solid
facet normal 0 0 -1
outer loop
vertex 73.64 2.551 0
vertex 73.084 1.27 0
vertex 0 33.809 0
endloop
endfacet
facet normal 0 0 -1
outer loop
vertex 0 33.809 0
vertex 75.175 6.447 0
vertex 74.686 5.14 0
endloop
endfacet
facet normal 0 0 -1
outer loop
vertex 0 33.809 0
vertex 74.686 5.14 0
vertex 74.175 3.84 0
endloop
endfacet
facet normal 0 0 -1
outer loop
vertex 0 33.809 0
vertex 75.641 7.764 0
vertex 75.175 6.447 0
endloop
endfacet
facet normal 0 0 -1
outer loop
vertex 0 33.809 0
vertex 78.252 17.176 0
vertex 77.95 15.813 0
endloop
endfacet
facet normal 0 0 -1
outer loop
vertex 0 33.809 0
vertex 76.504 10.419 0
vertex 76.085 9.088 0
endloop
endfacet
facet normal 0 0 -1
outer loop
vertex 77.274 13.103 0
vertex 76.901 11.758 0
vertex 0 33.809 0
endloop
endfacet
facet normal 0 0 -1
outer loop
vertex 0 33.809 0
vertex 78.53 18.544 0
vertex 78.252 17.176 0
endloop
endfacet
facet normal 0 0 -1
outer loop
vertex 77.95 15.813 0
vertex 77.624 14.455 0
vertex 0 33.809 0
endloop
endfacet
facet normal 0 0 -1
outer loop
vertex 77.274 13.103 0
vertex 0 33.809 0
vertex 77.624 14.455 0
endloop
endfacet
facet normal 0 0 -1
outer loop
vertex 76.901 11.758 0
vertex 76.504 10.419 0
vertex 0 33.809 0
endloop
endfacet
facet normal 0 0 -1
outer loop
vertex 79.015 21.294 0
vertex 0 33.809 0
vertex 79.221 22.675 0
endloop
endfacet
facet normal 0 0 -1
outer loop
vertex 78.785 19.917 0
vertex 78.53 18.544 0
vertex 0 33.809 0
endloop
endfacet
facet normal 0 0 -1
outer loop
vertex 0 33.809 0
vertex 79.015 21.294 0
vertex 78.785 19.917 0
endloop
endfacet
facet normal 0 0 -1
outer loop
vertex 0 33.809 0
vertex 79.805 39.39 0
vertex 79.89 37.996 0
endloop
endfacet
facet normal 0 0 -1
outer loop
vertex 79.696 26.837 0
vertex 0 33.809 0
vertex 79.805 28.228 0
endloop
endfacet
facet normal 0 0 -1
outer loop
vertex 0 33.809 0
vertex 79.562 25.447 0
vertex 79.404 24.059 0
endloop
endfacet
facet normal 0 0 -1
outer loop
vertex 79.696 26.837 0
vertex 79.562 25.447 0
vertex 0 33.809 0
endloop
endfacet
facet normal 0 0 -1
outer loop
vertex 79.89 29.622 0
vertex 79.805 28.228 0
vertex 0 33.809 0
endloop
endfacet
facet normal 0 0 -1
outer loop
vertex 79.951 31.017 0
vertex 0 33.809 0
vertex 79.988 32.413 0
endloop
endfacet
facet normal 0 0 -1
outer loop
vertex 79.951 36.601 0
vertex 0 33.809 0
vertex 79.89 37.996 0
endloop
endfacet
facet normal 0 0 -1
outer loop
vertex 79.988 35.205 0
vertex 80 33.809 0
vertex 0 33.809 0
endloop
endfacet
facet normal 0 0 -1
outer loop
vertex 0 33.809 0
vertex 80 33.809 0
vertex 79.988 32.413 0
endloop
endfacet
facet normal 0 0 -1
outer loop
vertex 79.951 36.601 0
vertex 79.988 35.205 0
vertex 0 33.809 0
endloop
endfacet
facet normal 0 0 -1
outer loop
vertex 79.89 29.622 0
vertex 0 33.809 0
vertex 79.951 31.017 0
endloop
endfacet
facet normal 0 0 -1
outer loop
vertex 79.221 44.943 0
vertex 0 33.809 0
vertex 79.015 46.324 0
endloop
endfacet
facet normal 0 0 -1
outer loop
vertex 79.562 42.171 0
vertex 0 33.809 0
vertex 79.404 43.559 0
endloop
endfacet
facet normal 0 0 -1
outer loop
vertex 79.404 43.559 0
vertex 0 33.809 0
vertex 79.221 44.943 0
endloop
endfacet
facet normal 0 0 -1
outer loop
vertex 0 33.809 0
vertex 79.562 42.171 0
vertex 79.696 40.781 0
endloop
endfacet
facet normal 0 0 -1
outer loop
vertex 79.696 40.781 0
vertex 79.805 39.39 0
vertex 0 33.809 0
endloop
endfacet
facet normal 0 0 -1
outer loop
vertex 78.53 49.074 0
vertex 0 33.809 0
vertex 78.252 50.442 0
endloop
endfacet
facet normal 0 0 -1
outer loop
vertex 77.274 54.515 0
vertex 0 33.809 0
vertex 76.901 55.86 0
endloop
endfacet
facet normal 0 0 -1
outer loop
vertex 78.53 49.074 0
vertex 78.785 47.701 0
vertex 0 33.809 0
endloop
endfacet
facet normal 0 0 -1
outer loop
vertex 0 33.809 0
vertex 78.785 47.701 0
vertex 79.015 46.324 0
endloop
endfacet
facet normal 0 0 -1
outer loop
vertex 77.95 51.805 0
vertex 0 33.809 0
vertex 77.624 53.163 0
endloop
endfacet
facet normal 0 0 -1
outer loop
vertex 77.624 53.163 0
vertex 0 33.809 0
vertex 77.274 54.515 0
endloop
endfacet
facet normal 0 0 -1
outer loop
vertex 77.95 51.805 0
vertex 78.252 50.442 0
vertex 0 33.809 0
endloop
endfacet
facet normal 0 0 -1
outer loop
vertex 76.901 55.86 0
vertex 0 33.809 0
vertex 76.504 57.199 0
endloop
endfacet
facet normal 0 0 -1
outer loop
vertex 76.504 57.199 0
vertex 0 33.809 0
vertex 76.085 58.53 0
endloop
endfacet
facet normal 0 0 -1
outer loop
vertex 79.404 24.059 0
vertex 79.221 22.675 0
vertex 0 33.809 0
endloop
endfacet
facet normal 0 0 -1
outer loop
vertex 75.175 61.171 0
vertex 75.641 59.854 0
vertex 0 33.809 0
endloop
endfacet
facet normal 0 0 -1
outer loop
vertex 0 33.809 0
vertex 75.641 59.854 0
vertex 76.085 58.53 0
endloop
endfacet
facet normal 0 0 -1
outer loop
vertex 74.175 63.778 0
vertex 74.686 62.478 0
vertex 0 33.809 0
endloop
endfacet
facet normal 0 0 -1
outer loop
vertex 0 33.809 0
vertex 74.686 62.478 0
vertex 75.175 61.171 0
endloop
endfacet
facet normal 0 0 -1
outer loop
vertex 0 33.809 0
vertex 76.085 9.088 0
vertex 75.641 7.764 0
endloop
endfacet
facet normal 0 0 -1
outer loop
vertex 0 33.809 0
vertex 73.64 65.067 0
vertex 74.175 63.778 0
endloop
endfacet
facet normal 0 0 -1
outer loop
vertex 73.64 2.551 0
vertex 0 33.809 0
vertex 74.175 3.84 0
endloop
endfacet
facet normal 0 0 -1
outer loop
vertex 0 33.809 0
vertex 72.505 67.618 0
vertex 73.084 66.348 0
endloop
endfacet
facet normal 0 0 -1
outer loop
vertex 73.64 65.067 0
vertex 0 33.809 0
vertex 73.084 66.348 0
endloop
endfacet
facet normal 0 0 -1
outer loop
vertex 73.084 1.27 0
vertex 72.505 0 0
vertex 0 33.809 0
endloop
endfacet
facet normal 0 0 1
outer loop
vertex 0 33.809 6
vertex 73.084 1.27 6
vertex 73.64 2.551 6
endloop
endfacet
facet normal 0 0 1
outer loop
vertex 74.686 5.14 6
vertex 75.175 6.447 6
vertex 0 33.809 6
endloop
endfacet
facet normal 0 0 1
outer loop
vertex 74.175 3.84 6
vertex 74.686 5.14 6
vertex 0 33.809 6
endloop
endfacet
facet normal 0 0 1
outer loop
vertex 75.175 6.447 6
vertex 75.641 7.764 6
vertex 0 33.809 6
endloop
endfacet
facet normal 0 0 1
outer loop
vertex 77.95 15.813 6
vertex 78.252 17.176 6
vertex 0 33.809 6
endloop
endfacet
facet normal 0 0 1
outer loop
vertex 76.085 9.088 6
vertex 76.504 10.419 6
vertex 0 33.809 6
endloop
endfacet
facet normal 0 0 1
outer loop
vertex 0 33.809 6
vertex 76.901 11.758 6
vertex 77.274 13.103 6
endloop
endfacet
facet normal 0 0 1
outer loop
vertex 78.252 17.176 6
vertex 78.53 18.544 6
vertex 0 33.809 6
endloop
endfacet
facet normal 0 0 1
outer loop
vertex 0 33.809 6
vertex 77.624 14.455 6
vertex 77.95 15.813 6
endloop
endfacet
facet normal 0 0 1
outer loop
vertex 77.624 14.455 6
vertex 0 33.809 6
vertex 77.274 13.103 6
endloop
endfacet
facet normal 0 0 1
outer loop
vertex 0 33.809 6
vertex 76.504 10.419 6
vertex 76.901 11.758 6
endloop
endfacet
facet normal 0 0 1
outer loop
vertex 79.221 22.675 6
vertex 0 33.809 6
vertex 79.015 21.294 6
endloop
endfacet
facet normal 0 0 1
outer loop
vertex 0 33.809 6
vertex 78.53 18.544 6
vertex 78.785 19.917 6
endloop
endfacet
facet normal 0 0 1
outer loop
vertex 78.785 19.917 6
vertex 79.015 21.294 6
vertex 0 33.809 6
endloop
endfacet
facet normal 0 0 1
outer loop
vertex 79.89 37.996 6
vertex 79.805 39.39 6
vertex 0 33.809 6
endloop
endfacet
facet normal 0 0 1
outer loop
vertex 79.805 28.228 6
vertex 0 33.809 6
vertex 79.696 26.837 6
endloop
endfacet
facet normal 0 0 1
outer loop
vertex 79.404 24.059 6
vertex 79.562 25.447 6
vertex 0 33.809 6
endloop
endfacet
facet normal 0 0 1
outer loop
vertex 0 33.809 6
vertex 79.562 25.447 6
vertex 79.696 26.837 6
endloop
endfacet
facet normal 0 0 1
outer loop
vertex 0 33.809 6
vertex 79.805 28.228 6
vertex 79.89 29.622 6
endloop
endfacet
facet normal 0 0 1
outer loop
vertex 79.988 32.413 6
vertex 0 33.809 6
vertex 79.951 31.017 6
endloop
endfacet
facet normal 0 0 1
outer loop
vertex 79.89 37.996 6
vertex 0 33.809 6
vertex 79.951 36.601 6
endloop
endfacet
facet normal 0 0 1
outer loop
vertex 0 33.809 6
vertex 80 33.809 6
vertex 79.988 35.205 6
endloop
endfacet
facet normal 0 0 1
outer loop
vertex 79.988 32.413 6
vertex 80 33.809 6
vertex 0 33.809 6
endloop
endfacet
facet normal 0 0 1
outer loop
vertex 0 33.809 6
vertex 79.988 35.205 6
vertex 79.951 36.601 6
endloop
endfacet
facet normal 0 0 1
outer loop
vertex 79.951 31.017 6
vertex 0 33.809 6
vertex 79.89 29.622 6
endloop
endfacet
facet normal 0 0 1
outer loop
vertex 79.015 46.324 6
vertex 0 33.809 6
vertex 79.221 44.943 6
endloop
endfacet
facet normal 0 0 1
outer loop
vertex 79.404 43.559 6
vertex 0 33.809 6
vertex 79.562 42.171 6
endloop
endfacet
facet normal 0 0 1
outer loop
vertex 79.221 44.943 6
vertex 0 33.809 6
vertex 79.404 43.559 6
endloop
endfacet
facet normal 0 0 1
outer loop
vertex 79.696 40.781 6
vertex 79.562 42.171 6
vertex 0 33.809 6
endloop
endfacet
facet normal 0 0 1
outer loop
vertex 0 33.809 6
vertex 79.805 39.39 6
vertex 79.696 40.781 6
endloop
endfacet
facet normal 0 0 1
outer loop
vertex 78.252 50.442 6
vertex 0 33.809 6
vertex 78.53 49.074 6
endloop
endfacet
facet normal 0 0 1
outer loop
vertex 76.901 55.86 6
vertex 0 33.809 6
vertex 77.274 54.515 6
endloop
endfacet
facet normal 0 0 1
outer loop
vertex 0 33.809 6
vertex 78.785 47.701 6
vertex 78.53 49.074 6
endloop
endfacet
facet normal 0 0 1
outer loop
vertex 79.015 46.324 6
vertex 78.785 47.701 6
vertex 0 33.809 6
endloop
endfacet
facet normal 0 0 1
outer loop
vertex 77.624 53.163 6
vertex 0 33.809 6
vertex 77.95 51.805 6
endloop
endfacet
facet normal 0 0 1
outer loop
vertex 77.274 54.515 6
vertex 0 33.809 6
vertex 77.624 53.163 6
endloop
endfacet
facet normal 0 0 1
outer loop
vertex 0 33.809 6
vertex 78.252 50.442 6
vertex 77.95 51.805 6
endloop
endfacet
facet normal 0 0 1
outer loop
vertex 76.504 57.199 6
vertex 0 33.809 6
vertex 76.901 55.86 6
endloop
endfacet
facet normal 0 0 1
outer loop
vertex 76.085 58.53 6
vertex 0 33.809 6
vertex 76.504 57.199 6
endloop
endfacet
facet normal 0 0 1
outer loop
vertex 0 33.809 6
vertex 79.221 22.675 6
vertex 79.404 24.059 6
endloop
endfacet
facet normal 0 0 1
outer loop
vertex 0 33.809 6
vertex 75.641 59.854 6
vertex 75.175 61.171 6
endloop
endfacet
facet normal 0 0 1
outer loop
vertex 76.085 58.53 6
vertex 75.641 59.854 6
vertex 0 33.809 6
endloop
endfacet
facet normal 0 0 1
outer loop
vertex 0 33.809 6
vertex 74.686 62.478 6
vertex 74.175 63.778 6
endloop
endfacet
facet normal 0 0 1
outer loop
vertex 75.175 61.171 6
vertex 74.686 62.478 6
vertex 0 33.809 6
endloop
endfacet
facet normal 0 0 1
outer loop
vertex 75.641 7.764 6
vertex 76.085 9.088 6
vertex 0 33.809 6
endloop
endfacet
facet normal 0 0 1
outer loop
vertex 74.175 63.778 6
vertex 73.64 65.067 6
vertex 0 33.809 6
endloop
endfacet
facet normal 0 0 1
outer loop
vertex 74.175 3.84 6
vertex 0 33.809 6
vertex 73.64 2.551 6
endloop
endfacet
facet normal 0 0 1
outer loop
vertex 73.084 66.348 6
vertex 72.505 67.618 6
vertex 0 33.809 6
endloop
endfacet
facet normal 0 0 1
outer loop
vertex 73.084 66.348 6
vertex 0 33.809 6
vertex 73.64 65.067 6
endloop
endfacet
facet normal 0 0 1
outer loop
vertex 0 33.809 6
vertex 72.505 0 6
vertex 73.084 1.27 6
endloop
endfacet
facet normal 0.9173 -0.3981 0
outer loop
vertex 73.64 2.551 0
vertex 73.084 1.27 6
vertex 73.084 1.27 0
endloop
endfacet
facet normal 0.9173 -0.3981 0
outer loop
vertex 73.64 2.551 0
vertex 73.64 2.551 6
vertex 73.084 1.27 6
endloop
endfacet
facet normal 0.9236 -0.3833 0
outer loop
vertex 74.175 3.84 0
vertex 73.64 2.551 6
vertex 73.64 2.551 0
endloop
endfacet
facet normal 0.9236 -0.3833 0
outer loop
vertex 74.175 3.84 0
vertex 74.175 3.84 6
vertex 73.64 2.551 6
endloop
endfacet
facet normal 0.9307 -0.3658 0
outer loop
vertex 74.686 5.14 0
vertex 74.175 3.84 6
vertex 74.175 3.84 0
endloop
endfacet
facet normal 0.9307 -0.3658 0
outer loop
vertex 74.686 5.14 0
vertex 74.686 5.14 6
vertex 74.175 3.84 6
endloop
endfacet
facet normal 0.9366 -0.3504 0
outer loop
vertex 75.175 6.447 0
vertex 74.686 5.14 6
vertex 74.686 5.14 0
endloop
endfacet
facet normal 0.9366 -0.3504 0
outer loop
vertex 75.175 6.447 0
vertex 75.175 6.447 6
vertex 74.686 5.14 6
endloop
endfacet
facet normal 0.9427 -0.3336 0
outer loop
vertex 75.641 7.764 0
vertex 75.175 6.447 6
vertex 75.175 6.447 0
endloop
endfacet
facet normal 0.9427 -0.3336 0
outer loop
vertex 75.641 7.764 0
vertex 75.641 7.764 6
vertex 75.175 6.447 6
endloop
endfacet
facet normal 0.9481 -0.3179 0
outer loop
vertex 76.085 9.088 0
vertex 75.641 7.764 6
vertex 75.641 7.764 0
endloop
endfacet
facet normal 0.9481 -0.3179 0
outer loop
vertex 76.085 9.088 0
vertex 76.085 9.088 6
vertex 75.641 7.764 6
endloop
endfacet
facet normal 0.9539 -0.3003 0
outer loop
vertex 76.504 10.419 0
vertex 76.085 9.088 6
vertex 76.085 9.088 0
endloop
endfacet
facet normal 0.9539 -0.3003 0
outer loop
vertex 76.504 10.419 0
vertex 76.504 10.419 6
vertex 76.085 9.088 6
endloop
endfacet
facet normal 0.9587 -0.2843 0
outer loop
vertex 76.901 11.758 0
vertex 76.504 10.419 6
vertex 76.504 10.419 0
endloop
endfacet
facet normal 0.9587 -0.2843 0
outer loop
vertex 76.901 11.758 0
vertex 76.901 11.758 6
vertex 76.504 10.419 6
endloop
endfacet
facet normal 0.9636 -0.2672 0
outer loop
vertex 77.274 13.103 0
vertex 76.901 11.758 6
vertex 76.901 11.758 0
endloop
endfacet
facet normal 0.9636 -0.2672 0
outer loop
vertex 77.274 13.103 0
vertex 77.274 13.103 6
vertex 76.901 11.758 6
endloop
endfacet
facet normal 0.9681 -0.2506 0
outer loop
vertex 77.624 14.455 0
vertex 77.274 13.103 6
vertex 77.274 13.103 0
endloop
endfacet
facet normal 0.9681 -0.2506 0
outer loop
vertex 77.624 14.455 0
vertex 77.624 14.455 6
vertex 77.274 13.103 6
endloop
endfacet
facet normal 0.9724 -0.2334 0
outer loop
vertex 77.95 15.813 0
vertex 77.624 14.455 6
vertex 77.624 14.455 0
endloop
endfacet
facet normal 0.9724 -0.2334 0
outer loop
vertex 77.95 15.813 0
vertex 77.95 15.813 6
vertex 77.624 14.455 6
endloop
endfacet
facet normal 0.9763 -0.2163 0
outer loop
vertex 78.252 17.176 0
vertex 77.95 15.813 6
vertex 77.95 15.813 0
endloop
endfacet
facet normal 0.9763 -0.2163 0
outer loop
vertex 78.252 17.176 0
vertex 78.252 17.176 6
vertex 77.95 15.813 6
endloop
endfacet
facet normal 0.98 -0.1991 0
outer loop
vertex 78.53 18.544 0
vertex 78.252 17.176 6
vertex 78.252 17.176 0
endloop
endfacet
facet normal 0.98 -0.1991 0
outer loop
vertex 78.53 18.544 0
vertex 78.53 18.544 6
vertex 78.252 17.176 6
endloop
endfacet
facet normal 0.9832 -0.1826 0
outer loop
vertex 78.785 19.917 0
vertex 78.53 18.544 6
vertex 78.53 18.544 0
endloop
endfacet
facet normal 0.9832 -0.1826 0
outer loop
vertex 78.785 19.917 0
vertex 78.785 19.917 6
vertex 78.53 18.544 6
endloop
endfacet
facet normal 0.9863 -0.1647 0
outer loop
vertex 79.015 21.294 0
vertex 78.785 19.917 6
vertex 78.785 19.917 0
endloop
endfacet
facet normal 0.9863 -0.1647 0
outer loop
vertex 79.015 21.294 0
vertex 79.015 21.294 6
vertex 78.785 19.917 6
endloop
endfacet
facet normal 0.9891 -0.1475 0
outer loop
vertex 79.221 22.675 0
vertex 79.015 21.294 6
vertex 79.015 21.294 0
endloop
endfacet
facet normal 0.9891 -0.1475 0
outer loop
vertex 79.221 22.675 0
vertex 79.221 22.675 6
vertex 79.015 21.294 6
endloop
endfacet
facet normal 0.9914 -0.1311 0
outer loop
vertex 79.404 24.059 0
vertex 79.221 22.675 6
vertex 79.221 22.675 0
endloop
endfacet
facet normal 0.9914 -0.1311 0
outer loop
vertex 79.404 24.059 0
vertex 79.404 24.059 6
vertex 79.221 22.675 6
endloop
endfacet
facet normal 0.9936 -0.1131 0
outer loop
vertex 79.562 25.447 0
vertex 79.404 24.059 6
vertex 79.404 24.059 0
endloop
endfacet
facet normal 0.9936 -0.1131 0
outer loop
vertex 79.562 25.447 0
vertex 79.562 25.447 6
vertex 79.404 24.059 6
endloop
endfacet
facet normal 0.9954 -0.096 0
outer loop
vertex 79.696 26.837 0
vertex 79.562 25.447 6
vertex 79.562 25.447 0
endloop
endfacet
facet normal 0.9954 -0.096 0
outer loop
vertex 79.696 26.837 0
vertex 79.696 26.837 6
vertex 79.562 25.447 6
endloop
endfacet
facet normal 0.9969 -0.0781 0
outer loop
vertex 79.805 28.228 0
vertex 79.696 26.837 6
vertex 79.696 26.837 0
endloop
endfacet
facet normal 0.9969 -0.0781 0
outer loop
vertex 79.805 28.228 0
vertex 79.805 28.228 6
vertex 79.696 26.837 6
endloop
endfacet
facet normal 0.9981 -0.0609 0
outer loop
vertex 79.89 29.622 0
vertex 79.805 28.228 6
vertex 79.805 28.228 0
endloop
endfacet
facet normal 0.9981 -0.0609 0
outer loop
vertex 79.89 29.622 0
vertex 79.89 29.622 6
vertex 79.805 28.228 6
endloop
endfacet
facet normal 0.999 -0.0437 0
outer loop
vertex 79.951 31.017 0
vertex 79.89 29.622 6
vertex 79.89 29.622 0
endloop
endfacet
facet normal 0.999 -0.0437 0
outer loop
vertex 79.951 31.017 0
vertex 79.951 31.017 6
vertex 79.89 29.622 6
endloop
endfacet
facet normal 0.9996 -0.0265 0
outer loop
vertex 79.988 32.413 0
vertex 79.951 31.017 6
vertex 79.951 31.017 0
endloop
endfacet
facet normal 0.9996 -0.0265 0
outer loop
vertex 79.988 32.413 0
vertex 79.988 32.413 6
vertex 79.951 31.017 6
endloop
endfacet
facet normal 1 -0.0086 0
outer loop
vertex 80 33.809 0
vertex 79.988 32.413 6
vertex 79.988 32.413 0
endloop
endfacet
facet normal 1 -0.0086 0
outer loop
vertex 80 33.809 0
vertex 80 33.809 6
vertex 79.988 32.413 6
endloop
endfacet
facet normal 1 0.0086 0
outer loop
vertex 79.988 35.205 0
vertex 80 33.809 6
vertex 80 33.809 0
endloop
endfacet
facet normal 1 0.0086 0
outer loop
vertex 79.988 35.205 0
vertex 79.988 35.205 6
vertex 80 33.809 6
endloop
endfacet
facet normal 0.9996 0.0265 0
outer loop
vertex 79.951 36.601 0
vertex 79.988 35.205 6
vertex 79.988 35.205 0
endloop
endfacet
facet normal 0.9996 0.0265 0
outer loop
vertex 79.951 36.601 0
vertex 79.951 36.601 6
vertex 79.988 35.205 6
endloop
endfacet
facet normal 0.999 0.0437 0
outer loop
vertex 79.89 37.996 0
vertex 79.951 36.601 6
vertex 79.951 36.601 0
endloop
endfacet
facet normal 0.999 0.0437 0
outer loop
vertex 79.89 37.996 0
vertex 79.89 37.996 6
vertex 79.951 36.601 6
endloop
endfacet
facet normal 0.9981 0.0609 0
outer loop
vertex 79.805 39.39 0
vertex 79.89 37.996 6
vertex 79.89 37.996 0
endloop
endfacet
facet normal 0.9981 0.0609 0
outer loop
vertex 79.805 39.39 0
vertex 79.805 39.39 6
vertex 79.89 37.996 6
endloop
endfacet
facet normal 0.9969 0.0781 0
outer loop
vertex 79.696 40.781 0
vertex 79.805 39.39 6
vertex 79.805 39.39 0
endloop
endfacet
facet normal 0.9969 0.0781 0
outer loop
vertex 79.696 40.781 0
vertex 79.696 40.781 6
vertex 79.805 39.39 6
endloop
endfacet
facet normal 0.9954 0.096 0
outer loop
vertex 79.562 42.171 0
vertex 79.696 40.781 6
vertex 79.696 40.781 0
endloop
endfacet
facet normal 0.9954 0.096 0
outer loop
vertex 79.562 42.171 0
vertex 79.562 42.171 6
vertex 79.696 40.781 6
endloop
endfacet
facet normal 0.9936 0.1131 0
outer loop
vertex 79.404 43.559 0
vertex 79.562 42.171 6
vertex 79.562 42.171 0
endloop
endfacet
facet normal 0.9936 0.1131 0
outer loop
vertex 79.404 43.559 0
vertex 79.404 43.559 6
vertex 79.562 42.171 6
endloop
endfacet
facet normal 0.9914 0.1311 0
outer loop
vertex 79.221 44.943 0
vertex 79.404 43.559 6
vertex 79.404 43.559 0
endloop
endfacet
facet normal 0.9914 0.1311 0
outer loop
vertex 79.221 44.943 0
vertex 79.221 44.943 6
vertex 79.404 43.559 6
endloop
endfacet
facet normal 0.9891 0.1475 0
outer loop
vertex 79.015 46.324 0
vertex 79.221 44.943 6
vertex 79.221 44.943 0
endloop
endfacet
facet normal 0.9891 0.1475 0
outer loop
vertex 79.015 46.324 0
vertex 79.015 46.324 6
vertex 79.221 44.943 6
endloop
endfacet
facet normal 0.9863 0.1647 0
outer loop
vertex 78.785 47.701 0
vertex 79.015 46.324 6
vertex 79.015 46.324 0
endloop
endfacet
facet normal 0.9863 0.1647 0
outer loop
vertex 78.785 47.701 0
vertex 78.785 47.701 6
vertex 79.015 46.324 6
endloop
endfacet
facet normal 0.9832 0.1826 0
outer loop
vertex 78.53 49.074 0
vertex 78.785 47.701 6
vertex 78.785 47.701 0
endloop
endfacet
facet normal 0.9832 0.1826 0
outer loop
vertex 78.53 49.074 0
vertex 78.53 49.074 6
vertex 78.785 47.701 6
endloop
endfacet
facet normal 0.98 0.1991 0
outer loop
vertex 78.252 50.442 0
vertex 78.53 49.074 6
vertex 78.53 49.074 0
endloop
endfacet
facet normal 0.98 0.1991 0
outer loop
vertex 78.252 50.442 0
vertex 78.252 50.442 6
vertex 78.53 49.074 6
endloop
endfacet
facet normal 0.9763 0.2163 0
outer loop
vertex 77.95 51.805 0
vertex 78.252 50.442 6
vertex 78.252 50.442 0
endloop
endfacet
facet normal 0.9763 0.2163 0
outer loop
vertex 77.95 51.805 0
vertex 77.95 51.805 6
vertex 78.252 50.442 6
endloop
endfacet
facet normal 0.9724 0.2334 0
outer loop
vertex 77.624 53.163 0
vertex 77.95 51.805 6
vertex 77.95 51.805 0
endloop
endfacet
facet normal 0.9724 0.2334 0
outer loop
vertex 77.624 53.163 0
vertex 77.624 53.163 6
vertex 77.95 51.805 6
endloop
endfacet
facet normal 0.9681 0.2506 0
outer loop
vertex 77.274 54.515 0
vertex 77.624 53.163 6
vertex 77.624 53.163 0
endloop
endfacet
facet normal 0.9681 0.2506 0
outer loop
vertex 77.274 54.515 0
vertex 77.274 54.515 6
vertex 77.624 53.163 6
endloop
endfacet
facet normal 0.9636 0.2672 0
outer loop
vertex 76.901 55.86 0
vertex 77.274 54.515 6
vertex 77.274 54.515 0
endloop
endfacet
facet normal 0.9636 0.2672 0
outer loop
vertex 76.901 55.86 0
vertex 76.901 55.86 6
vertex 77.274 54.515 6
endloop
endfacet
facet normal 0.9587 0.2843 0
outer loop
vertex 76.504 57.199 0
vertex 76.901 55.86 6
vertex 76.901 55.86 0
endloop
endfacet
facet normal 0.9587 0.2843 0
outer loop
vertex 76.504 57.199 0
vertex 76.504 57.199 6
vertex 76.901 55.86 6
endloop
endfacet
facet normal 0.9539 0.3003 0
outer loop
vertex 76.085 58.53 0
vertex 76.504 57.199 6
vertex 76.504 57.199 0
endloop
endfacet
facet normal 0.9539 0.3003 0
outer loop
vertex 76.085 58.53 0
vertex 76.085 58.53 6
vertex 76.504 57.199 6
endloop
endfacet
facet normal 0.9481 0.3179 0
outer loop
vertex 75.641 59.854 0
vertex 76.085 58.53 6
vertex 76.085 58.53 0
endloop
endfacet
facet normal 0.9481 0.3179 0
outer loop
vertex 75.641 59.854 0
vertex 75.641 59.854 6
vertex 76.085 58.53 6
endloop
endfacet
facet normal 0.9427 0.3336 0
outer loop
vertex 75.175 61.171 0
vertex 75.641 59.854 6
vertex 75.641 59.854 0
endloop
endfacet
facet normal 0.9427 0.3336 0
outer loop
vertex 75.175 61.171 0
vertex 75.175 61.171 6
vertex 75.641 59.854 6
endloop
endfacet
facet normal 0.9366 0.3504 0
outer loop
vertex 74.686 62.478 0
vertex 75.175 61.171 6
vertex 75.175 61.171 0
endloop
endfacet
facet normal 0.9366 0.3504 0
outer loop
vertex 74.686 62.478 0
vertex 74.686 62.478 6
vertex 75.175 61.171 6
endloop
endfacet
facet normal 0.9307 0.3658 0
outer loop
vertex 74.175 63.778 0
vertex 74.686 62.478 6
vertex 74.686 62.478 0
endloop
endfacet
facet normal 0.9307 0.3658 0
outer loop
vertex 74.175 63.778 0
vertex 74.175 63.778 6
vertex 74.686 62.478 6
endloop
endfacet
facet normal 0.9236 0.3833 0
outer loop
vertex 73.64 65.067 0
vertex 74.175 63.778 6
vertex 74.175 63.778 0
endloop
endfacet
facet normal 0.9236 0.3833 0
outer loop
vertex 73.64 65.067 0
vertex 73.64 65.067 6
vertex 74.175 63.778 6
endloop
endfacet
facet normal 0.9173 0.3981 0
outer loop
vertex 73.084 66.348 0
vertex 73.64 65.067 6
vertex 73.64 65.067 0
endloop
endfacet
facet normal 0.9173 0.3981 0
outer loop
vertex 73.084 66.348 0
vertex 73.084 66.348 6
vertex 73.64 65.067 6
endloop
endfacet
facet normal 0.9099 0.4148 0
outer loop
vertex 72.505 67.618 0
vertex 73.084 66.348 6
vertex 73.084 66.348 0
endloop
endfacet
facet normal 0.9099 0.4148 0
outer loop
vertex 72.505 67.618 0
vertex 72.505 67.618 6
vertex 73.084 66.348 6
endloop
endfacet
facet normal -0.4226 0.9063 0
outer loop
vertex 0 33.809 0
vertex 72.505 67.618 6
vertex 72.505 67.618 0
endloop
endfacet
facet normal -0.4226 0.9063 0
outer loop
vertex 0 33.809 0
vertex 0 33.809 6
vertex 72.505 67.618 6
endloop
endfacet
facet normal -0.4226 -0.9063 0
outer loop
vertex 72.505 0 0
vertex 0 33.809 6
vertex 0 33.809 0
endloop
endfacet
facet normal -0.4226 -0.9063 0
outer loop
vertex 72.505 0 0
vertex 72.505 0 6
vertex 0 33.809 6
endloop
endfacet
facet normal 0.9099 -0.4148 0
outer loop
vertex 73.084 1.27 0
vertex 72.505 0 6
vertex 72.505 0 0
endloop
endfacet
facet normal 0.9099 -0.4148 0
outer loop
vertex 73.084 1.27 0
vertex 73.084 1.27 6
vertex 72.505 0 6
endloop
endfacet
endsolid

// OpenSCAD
$fn = 32;

// ----------------------------------------------------------------------
// Arc profile plate: sector, 52 points
// ----------------------------------------------------------------------

// --- parameters (mm) ---
sector_angle = 50;        // sector angle, degrees
sector_r = 80;            // outer radius
arc_step = 1;             // sampling step of the arc, degrees
plate_t = 6;              // plate thickness, Z

bbox_x = 2 * sector_r * sin(sector_angle / 2);  // chord of the sector
bbox_y = sector_r;  // depth of the sector (apex to arc)

profile = [[72.505, 0], [73.084, 1.27], [73.64, 2.551], [74.175, 3.84], [74.686, 5.14], [75.175, 6.447], [75.641, 7.764], [76.085, 9.088], [76.504, 10.419], [76.901, 11.758], [77.274, 13.103], [77.624, 14.455], [77.95, 15.813], [78.252, 17.176], [78.53, 18.544], [78.785, 19.917], [79.015, 21.294], [79.221, 22.675], [79.404, 24.059], [79.562, 25.447], [79.696, 26.837], [79.805, 28.228], [79.89, 29.622], [79.951, 31.017], [79.988, 32.413], [80, 33.809], [79.988, 35.205], [79.951, 36.601], [79.89, 37.996], [79.805, 39.39], [79.696, 40.781], [79.562, 42.171], [79.404, 43.559], [79.221, 44.943], [79.015, 46.324], [78.785, 47.701], [78.53, 49.074], [78.252, 50.442], [77.95, 51.805], [77.624, 53.163], [77.274, 54.515], [76.901, 55.86], [76.504, 57.199], [76.085, 58.53], [75.641, 59.854], [75.175, 61.171], [74.686, 62.478], [74.175, 63.778], [73.64, 65.067], [73.084, 66.348], [72.505, 67.618], [0, 33.809]];  // primary outline, 52 points, counter clockwise

// --- the one profile operation ---
linear_extrude(height = plate_t) polygon(points = profile);
